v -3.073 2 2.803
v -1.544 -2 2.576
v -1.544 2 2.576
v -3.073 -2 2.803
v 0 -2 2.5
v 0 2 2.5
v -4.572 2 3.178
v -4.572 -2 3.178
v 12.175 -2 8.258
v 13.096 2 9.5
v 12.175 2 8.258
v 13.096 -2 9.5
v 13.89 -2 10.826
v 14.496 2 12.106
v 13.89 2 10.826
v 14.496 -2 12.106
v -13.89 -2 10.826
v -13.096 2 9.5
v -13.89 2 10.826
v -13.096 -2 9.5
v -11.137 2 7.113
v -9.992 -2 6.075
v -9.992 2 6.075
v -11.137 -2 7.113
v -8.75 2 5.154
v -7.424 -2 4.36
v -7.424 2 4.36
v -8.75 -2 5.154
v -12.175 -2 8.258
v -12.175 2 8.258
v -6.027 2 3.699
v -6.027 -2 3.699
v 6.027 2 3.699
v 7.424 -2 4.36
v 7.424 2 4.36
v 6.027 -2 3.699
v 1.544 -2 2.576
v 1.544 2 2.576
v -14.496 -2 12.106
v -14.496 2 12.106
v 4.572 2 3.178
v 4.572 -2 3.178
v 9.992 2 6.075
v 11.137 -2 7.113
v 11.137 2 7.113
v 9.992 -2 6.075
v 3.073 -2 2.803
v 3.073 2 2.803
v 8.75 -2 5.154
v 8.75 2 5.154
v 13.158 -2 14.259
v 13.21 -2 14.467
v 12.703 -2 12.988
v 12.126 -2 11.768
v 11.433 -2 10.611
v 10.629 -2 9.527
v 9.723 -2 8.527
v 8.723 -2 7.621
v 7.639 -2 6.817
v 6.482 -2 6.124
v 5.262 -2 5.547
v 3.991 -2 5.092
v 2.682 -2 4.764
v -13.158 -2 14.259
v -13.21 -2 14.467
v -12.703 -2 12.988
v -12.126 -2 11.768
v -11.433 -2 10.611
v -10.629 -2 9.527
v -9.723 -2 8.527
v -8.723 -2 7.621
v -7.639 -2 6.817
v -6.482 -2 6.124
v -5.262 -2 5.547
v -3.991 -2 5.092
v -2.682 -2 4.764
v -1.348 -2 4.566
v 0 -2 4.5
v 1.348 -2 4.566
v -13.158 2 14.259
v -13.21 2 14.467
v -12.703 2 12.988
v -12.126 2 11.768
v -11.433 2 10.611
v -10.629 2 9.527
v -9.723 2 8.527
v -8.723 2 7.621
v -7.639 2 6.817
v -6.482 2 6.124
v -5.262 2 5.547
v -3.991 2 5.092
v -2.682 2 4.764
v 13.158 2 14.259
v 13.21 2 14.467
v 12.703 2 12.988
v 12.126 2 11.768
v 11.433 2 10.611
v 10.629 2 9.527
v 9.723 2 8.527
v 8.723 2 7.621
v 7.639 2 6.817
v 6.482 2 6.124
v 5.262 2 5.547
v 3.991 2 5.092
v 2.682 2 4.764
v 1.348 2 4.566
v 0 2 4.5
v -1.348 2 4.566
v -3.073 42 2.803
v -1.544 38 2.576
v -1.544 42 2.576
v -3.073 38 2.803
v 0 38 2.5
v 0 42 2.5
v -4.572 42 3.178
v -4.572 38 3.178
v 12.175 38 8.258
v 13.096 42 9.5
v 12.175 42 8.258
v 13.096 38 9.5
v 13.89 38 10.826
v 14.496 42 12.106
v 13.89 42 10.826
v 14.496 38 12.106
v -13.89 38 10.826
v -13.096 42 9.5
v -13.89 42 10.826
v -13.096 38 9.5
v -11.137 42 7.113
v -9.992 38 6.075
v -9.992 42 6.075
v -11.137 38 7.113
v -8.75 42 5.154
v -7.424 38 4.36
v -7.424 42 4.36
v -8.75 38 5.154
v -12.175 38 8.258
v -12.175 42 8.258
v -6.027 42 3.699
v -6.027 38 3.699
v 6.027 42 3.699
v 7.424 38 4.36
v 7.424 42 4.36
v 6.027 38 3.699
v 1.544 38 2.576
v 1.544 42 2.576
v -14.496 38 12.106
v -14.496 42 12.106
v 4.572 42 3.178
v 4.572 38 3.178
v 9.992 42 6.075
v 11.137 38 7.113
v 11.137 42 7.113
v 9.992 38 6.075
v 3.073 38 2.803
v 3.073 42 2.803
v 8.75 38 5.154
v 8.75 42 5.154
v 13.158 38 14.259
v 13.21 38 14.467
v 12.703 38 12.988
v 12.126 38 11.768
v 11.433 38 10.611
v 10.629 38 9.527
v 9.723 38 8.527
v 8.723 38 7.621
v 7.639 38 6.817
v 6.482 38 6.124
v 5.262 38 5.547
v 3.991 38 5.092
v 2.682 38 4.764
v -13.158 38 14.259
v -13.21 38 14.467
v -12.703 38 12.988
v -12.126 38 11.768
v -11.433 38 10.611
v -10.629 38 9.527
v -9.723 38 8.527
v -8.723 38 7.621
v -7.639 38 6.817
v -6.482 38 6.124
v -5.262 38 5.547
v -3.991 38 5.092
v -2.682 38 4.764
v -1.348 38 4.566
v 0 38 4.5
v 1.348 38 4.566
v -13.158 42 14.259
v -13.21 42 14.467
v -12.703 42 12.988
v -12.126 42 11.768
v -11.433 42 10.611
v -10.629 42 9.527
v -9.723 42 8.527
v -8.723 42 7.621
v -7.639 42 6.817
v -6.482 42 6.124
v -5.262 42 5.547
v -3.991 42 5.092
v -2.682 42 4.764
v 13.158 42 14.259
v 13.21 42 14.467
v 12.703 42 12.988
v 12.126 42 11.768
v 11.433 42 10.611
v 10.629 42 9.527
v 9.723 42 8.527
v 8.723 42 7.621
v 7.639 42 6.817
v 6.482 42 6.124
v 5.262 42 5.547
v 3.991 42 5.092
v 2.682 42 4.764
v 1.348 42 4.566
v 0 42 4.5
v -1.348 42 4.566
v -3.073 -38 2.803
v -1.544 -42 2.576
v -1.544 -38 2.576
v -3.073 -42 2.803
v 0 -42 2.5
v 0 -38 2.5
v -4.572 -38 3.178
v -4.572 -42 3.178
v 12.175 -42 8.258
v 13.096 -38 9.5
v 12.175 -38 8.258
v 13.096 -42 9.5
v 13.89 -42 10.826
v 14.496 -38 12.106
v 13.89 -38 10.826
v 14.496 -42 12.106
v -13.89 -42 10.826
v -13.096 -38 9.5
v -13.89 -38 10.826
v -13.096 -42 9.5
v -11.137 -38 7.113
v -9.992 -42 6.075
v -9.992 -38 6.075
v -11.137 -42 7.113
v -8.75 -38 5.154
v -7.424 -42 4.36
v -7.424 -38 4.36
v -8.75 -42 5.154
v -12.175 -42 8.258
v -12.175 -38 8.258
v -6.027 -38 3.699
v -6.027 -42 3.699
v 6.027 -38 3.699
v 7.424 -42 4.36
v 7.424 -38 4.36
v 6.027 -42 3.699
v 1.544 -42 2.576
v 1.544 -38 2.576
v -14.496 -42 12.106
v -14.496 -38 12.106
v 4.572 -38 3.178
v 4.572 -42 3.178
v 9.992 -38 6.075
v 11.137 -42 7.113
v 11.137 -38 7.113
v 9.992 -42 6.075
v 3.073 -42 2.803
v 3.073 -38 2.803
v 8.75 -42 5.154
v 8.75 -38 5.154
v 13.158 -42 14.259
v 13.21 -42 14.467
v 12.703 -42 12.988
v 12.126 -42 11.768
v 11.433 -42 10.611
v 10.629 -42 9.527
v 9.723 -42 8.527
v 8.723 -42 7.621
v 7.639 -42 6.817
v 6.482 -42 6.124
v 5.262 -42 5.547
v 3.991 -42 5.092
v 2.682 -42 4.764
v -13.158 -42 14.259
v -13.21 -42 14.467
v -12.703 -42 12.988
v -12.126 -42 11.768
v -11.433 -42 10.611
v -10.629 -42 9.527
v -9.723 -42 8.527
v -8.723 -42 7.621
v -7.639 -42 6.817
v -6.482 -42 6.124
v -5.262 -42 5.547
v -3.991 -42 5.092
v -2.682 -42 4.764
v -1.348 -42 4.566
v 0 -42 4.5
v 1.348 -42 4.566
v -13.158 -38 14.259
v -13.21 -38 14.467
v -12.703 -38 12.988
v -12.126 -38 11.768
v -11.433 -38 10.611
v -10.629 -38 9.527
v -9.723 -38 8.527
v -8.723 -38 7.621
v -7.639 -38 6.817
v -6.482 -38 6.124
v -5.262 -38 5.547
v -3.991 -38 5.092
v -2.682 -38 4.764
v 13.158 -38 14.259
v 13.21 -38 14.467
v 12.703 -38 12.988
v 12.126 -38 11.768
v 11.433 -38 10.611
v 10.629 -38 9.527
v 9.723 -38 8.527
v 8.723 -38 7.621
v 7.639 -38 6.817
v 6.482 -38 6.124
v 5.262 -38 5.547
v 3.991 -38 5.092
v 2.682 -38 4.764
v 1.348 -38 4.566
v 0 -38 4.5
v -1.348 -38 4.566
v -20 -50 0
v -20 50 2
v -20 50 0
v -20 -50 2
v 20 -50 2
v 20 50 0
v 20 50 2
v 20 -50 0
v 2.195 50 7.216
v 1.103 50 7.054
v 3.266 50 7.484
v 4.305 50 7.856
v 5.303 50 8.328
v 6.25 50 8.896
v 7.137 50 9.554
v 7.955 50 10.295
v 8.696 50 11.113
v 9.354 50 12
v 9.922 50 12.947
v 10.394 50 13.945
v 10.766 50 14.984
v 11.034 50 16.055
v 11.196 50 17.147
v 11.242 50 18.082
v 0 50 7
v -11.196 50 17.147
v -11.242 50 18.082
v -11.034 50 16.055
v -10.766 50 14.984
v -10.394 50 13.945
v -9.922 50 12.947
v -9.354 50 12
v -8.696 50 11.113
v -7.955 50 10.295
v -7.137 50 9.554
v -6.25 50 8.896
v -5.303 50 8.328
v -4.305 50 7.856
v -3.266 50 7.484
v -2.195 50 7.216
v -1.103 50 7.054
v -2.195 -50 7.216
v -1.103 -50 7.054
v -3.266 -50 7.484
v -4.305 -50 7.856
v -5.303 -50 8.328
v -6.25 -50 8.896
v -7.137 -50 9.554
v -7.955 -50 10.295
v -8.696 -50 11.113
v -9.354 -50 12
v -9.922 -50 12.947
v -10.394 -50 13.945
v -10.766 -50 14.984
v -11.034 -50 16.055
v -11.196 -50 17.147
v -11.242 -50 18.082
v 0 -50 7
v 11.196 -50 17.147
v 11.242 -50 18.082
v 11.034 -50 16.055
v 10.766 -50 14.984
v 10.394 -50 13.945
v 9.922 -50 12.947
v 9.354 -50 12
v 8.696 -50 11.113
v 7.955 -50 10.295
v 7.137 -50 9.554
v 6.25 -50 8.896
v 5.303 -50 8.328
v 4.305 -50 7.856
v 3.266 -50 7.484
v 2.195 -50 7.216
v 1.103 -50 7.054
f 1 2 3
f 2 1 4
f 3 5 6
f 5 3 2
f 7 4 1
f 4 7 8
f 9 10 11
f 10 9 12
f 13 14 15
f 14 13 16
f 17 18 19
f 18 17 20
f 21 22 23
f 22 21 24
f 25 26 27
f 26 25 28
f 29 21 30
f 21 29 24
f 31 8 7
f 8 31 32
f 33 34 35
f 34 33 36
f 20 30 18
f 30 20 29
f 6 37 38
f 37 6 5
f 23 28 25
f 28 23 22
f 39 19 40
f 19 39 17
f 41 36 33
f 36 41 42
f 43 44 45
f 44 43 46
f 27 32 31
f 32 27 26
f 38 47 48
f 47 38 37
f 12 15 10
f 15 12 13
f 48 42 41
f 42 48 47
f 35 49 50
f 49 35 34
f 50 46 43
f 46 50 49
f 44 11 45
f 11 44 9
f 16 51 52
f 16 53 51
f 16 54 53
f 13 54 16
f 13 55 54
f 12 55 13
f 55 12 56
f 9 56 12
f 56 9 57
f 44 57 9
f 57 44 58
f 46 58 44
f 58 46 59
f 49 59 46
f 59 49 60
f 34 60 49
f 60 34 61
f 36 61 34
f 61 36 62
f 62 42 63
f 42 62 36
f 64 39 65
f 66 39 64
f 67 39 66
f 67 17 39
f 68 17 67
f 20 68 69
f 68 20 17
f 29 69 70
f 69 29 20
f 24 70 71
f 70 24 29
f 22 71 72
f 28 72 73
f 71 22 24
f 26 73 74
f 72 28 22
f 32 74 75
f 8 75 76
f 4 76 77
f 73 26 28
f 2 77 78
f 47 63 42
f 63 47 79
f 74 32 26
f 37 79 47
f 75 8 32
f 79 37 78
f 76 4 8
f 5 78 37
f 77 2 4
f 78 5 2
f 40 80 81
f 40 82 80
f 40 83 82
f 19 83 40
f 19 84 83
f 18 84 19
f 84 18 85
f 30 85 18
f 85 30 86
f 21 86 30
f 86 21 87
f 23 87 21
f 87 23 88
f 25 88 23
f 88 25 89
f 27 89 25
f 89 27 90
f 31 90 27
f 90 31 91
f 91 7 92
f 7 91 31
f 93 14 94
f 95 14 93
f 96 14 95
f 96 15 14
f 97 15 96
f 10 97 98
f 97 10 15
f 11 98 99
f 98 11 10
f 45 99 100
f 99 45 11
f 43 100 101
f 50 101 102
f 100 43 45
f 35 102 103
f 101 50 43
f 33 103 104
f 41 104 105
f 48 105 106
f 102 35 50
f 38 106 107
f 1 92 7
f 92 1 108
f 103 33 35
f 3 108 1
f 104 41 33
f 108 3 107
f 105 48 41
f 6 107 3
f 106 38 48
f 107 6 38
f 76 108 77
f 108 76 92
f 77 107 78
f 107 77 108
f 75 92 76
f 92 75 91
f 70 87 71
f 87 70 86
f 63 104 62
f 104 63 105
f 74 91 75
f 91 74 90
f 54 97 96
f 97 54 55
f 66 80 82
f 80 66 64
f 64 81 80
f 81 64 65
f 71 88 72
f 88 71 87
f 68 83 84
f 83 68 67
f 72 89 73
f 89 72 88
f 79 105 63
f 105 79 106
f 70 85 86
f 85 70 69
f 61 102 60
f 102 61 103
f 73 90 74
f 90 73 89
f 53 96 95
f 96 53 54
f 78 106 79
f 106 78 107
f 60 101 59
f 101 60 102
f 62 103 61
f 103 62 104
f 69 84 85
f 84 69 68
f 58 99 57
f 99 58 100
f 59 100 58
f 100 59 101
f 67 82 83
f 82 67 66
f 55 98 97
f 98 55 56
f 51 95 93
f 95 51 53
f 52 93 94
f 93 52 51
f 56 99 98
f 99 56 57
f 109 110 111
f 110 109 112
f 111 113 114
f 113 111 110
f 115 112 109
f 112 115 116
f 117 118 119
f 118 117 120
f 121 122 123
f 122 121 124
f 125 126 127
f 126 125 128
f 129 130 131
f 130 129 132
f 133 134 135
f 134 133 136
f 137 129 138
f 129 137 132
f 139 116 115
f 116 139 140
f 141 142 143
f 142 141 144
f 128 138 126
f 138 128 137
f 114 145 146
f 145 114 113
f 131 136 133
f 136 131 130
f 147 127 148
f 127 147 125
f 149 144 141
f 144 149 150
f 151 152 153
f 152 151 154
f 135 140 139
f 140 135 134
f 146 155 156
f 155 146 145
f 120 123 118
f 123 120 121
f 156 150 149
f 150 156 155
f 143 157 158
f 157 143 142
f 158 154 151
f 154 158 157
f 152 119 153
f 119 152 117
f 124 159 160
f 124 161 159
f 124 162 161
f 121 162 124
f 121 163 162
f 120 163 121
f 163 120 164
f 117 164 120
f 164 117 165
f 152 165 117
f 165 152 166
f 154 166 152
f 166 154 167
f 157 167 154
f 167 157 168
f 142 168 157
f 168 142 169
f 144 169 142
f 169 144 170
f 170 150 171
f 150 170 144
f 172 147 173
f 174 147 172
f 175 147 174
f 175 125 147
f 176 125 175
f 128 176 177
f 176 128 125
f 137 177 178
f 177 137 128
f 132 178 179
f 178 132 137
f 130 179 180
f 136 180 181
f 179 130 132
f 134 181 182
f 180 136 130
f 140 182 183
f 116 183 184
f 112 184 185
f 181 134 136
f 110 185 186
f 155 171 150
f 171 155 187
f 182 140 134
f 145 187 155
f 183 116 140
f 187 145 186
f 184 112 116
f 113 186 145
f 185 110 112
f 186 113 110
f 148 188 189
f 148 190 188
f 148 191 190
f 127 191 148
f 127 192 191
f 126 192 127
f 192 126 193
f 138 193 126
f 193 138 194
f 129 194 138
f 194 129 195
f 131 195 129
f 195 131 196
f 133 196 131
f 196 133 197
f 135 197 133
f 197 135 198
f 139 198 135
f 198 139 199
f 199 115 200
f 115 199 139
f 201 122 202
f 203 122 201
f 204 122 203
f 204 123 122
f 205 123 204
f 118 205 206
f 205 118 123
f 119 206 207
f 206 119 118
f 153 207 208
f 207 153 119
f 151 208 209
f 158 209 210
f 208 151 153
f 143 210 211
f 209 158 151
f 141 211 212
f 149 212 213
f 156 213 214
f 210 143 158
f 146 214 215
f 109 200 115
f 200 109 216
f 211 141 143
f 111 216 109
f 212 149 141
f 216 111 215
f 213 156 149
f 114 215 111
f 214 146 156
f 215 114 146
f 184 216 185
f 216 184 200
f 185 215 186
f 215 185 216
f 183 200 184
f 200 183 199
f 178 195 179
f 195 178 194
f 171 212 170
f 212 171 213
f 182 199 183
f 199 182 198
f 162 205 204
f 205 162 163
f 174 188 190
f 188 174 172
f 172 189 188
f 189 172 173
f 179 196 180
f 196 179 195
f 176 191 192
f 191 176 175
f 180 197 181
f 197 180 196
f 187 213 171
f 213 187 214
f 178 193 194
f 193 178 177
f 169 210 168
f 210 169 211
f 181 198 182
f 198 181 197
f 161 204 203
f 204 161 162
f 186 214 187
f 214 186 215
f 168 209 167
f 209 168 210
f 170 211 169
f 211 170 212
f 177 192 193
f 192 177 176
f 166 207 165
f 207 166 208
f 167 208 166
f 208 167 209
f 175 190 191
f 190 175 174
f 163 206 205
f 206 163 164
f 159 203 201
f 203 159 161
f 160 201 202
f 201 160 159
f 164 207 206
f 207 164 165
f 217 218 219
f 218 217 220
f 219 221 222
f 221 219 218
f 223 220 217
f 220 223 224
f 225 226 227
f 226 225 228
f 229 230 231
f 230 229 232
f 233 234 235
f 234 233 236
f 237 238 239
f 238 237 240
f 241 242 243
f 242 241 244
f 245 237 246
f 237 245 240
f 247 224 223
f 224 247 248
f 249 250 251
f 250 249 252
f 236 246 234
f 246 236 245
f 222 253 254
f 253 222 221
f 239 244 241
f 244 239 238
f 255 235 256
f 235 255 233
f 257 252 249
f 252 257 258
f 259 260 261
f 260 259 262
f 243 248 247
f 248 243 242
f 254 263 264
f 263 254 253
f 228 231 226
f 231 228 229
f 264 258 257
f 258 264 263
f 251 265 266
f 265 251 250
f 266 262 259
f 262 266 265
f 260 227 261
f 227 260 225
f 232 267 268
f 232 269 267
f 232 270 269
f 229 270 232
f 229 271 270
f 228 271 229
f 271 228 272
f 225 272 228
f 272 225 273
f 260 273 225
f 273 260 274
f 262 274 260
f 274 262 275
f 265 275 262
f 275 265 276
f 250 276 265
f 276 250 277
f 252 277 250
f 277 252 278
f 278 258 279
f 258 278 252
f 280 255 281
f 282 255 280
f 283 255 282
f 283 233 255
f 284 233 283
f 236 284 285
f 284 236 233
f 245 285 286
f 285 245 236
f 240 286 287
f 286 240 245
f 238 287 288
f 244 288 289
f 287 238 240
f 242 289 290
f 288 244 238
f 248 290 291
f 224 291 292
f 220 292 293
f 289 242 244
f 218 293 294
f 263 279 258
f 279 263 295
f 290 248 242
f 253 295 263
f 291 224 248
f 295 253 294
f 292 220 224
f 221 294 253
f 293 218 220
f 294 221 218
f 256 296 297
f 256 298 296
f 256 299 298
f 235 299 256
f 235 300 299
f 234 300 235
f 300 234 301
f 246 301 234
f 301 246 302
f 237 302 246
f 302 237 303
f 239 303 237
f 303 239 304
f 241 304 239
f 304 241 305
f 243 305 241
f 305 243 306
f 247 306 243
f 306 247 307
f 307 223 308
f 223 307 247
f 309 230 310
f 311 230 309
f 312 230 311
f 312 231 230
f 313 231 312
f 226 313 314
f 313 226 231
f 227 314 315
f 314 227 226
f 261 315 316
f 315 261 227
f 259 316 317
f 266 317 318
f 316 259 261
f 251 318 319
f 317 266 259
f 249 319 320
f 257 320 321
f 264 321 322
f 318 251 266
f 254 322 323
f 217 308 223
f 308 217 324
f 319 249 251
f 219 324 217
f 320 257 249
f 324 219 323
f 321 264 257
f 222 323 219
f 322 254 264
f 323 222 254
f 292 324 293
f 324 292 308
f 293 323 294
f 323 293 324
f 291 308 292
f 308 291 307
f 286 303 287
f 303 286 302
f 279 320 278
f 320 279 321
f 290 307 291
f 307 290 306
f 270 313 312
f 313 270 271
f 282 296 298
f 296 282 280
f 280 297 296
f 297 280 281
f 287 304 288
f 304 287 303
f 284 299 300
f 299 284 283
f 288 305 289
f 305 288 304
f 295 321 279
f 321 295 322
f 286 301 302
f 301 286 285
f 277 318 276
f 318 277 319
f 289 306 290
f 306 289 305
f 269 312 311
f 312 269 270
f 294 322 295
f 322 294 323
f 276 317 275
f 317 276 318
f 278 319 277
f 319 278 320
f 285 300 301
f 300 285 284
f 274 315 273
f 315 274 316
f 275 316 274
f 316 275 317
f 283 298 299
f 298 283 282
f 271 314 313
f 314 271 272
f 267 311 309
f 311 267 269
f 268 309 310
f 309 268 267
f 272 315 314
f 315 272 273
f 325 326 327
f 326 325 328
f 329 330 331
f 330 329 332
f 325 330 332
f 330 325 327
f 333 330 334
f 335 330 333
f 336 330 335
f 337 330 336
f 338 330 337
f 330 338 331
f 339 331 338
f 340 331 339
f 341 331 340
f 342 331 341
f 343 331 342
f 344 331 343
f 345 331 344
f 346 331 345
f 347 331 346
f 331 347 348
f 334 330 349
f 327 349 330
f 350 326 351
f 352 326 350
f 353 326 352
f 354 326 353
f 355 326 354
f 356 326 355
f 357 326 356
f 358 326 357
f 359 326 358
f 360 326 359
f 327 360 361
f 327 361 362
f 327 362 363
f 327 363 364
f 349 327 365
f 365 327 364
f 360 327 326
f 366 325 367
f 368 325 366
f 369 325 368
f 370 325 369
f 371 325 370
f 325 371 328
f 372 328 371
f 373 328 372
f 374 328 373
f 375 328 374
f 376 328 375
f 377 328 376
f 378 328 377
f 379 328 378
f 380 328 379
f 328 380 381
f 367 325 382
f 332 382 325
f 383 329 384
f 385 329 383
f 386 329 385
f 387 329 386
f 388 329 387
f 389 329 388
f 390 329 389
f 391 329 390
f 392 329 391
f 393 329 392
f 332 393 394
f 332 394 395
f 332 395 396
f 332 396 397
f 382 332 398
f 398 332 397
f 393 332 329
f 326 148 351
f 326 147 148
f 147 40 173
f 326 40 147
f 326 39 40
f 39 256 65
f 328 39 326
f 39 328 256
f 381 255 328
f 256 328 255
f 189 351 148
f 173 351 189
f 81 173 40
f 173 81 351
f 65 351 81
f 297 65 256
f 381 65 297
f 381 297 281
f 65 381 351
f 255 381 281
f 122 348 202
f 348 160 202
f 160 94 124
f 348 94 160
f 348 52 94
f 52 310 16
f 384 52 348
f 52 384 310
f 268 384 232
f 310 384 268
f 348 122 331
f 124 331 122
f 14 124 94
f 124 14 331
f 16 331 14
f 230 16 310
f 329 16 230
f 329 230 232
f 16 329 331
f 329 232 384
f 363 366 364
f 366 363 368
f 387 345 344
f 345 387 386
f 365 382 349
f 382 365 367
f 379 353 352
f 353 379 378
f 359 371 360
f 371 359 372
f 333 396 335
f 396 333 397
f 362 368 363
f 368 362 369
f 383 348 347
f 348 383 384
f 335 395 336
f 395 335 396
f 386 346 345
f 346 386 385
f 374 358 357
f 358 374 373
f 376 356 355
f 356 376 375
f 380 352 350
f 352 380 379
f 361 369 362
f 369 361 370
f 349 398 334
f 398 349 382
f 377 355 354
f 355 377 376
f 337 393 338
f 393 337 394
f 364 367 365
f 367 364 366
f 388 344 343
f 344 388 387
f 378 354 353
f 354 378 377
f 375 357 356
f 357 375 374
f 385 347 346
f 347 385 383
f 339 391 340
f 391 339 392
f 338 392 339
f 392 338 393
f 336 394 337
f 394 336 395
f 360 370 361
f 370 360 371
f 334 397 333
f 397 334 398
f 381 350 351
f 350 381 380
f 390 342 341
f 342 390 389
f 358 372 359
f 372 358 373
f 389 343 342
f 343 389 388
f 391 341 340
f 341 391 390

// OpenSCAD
$fn=60+4;

//camera mount pole mounting legnth
camera_mount_lenght = 100 ;

//camera mount pole mount width
camera_mount_width = 40 ;

//camera leg pole diameter
pole_diameter = 22.5 ;

//ziptie width for atatchment add a bit for clearance
ziptie_width = 4 ;

//ziptie height for atatchment
ziptie_height = 2 ;

pole_diameter2 = pole_diameter/2;

centre_point = pole_diameter2+5+ziptie_height ;

rotate([0,0,90])difference(){
	hull(){
		translate([0,0,1])cube([camera_mount_lenght,camera_mount_width,2],true);
		difference(){
			translate([0,0,centre_point])rotate([0,90,0])cylinder(camera_mount_lenght,pole_diameter2-0.1,pole_diameter2-0.1,true);
			translate([0,0,centre_point+pole_diameter2])cube([camera_mount_lenght+2,pole_diameter+2,pole_diameter],true);
			}
		}
	translate([0,0,centre_point])rotate([0,90,0])cylinder(camera_mount_lenght+0.2,pole_diameter2,pole_diameter2,true);
//	translate([0,0,centre_point])cube([camera_mount_lenght+pole_diameter2,camera_mount_width+pole_diameter2,10],true);
	translate([camera_mount_lenght/2-10,0,0])zip();
	zip();
	translate([-camera_mount_lenght/2+10,0,0])zip();
	}

module zip(){
	translate([0,0,centre_point])rotate([0,90,0]){
		difference(){
			cylinder(ziptie_width,pole_diameter2+2.5+ziptie_height,pole_diameter2+2.5+ziptie_height,true);
			cylinder(ziptie_width+0.2,pole_diameter2+2.5,pole_diameter2+2.5,true);
			}
		}
	}
